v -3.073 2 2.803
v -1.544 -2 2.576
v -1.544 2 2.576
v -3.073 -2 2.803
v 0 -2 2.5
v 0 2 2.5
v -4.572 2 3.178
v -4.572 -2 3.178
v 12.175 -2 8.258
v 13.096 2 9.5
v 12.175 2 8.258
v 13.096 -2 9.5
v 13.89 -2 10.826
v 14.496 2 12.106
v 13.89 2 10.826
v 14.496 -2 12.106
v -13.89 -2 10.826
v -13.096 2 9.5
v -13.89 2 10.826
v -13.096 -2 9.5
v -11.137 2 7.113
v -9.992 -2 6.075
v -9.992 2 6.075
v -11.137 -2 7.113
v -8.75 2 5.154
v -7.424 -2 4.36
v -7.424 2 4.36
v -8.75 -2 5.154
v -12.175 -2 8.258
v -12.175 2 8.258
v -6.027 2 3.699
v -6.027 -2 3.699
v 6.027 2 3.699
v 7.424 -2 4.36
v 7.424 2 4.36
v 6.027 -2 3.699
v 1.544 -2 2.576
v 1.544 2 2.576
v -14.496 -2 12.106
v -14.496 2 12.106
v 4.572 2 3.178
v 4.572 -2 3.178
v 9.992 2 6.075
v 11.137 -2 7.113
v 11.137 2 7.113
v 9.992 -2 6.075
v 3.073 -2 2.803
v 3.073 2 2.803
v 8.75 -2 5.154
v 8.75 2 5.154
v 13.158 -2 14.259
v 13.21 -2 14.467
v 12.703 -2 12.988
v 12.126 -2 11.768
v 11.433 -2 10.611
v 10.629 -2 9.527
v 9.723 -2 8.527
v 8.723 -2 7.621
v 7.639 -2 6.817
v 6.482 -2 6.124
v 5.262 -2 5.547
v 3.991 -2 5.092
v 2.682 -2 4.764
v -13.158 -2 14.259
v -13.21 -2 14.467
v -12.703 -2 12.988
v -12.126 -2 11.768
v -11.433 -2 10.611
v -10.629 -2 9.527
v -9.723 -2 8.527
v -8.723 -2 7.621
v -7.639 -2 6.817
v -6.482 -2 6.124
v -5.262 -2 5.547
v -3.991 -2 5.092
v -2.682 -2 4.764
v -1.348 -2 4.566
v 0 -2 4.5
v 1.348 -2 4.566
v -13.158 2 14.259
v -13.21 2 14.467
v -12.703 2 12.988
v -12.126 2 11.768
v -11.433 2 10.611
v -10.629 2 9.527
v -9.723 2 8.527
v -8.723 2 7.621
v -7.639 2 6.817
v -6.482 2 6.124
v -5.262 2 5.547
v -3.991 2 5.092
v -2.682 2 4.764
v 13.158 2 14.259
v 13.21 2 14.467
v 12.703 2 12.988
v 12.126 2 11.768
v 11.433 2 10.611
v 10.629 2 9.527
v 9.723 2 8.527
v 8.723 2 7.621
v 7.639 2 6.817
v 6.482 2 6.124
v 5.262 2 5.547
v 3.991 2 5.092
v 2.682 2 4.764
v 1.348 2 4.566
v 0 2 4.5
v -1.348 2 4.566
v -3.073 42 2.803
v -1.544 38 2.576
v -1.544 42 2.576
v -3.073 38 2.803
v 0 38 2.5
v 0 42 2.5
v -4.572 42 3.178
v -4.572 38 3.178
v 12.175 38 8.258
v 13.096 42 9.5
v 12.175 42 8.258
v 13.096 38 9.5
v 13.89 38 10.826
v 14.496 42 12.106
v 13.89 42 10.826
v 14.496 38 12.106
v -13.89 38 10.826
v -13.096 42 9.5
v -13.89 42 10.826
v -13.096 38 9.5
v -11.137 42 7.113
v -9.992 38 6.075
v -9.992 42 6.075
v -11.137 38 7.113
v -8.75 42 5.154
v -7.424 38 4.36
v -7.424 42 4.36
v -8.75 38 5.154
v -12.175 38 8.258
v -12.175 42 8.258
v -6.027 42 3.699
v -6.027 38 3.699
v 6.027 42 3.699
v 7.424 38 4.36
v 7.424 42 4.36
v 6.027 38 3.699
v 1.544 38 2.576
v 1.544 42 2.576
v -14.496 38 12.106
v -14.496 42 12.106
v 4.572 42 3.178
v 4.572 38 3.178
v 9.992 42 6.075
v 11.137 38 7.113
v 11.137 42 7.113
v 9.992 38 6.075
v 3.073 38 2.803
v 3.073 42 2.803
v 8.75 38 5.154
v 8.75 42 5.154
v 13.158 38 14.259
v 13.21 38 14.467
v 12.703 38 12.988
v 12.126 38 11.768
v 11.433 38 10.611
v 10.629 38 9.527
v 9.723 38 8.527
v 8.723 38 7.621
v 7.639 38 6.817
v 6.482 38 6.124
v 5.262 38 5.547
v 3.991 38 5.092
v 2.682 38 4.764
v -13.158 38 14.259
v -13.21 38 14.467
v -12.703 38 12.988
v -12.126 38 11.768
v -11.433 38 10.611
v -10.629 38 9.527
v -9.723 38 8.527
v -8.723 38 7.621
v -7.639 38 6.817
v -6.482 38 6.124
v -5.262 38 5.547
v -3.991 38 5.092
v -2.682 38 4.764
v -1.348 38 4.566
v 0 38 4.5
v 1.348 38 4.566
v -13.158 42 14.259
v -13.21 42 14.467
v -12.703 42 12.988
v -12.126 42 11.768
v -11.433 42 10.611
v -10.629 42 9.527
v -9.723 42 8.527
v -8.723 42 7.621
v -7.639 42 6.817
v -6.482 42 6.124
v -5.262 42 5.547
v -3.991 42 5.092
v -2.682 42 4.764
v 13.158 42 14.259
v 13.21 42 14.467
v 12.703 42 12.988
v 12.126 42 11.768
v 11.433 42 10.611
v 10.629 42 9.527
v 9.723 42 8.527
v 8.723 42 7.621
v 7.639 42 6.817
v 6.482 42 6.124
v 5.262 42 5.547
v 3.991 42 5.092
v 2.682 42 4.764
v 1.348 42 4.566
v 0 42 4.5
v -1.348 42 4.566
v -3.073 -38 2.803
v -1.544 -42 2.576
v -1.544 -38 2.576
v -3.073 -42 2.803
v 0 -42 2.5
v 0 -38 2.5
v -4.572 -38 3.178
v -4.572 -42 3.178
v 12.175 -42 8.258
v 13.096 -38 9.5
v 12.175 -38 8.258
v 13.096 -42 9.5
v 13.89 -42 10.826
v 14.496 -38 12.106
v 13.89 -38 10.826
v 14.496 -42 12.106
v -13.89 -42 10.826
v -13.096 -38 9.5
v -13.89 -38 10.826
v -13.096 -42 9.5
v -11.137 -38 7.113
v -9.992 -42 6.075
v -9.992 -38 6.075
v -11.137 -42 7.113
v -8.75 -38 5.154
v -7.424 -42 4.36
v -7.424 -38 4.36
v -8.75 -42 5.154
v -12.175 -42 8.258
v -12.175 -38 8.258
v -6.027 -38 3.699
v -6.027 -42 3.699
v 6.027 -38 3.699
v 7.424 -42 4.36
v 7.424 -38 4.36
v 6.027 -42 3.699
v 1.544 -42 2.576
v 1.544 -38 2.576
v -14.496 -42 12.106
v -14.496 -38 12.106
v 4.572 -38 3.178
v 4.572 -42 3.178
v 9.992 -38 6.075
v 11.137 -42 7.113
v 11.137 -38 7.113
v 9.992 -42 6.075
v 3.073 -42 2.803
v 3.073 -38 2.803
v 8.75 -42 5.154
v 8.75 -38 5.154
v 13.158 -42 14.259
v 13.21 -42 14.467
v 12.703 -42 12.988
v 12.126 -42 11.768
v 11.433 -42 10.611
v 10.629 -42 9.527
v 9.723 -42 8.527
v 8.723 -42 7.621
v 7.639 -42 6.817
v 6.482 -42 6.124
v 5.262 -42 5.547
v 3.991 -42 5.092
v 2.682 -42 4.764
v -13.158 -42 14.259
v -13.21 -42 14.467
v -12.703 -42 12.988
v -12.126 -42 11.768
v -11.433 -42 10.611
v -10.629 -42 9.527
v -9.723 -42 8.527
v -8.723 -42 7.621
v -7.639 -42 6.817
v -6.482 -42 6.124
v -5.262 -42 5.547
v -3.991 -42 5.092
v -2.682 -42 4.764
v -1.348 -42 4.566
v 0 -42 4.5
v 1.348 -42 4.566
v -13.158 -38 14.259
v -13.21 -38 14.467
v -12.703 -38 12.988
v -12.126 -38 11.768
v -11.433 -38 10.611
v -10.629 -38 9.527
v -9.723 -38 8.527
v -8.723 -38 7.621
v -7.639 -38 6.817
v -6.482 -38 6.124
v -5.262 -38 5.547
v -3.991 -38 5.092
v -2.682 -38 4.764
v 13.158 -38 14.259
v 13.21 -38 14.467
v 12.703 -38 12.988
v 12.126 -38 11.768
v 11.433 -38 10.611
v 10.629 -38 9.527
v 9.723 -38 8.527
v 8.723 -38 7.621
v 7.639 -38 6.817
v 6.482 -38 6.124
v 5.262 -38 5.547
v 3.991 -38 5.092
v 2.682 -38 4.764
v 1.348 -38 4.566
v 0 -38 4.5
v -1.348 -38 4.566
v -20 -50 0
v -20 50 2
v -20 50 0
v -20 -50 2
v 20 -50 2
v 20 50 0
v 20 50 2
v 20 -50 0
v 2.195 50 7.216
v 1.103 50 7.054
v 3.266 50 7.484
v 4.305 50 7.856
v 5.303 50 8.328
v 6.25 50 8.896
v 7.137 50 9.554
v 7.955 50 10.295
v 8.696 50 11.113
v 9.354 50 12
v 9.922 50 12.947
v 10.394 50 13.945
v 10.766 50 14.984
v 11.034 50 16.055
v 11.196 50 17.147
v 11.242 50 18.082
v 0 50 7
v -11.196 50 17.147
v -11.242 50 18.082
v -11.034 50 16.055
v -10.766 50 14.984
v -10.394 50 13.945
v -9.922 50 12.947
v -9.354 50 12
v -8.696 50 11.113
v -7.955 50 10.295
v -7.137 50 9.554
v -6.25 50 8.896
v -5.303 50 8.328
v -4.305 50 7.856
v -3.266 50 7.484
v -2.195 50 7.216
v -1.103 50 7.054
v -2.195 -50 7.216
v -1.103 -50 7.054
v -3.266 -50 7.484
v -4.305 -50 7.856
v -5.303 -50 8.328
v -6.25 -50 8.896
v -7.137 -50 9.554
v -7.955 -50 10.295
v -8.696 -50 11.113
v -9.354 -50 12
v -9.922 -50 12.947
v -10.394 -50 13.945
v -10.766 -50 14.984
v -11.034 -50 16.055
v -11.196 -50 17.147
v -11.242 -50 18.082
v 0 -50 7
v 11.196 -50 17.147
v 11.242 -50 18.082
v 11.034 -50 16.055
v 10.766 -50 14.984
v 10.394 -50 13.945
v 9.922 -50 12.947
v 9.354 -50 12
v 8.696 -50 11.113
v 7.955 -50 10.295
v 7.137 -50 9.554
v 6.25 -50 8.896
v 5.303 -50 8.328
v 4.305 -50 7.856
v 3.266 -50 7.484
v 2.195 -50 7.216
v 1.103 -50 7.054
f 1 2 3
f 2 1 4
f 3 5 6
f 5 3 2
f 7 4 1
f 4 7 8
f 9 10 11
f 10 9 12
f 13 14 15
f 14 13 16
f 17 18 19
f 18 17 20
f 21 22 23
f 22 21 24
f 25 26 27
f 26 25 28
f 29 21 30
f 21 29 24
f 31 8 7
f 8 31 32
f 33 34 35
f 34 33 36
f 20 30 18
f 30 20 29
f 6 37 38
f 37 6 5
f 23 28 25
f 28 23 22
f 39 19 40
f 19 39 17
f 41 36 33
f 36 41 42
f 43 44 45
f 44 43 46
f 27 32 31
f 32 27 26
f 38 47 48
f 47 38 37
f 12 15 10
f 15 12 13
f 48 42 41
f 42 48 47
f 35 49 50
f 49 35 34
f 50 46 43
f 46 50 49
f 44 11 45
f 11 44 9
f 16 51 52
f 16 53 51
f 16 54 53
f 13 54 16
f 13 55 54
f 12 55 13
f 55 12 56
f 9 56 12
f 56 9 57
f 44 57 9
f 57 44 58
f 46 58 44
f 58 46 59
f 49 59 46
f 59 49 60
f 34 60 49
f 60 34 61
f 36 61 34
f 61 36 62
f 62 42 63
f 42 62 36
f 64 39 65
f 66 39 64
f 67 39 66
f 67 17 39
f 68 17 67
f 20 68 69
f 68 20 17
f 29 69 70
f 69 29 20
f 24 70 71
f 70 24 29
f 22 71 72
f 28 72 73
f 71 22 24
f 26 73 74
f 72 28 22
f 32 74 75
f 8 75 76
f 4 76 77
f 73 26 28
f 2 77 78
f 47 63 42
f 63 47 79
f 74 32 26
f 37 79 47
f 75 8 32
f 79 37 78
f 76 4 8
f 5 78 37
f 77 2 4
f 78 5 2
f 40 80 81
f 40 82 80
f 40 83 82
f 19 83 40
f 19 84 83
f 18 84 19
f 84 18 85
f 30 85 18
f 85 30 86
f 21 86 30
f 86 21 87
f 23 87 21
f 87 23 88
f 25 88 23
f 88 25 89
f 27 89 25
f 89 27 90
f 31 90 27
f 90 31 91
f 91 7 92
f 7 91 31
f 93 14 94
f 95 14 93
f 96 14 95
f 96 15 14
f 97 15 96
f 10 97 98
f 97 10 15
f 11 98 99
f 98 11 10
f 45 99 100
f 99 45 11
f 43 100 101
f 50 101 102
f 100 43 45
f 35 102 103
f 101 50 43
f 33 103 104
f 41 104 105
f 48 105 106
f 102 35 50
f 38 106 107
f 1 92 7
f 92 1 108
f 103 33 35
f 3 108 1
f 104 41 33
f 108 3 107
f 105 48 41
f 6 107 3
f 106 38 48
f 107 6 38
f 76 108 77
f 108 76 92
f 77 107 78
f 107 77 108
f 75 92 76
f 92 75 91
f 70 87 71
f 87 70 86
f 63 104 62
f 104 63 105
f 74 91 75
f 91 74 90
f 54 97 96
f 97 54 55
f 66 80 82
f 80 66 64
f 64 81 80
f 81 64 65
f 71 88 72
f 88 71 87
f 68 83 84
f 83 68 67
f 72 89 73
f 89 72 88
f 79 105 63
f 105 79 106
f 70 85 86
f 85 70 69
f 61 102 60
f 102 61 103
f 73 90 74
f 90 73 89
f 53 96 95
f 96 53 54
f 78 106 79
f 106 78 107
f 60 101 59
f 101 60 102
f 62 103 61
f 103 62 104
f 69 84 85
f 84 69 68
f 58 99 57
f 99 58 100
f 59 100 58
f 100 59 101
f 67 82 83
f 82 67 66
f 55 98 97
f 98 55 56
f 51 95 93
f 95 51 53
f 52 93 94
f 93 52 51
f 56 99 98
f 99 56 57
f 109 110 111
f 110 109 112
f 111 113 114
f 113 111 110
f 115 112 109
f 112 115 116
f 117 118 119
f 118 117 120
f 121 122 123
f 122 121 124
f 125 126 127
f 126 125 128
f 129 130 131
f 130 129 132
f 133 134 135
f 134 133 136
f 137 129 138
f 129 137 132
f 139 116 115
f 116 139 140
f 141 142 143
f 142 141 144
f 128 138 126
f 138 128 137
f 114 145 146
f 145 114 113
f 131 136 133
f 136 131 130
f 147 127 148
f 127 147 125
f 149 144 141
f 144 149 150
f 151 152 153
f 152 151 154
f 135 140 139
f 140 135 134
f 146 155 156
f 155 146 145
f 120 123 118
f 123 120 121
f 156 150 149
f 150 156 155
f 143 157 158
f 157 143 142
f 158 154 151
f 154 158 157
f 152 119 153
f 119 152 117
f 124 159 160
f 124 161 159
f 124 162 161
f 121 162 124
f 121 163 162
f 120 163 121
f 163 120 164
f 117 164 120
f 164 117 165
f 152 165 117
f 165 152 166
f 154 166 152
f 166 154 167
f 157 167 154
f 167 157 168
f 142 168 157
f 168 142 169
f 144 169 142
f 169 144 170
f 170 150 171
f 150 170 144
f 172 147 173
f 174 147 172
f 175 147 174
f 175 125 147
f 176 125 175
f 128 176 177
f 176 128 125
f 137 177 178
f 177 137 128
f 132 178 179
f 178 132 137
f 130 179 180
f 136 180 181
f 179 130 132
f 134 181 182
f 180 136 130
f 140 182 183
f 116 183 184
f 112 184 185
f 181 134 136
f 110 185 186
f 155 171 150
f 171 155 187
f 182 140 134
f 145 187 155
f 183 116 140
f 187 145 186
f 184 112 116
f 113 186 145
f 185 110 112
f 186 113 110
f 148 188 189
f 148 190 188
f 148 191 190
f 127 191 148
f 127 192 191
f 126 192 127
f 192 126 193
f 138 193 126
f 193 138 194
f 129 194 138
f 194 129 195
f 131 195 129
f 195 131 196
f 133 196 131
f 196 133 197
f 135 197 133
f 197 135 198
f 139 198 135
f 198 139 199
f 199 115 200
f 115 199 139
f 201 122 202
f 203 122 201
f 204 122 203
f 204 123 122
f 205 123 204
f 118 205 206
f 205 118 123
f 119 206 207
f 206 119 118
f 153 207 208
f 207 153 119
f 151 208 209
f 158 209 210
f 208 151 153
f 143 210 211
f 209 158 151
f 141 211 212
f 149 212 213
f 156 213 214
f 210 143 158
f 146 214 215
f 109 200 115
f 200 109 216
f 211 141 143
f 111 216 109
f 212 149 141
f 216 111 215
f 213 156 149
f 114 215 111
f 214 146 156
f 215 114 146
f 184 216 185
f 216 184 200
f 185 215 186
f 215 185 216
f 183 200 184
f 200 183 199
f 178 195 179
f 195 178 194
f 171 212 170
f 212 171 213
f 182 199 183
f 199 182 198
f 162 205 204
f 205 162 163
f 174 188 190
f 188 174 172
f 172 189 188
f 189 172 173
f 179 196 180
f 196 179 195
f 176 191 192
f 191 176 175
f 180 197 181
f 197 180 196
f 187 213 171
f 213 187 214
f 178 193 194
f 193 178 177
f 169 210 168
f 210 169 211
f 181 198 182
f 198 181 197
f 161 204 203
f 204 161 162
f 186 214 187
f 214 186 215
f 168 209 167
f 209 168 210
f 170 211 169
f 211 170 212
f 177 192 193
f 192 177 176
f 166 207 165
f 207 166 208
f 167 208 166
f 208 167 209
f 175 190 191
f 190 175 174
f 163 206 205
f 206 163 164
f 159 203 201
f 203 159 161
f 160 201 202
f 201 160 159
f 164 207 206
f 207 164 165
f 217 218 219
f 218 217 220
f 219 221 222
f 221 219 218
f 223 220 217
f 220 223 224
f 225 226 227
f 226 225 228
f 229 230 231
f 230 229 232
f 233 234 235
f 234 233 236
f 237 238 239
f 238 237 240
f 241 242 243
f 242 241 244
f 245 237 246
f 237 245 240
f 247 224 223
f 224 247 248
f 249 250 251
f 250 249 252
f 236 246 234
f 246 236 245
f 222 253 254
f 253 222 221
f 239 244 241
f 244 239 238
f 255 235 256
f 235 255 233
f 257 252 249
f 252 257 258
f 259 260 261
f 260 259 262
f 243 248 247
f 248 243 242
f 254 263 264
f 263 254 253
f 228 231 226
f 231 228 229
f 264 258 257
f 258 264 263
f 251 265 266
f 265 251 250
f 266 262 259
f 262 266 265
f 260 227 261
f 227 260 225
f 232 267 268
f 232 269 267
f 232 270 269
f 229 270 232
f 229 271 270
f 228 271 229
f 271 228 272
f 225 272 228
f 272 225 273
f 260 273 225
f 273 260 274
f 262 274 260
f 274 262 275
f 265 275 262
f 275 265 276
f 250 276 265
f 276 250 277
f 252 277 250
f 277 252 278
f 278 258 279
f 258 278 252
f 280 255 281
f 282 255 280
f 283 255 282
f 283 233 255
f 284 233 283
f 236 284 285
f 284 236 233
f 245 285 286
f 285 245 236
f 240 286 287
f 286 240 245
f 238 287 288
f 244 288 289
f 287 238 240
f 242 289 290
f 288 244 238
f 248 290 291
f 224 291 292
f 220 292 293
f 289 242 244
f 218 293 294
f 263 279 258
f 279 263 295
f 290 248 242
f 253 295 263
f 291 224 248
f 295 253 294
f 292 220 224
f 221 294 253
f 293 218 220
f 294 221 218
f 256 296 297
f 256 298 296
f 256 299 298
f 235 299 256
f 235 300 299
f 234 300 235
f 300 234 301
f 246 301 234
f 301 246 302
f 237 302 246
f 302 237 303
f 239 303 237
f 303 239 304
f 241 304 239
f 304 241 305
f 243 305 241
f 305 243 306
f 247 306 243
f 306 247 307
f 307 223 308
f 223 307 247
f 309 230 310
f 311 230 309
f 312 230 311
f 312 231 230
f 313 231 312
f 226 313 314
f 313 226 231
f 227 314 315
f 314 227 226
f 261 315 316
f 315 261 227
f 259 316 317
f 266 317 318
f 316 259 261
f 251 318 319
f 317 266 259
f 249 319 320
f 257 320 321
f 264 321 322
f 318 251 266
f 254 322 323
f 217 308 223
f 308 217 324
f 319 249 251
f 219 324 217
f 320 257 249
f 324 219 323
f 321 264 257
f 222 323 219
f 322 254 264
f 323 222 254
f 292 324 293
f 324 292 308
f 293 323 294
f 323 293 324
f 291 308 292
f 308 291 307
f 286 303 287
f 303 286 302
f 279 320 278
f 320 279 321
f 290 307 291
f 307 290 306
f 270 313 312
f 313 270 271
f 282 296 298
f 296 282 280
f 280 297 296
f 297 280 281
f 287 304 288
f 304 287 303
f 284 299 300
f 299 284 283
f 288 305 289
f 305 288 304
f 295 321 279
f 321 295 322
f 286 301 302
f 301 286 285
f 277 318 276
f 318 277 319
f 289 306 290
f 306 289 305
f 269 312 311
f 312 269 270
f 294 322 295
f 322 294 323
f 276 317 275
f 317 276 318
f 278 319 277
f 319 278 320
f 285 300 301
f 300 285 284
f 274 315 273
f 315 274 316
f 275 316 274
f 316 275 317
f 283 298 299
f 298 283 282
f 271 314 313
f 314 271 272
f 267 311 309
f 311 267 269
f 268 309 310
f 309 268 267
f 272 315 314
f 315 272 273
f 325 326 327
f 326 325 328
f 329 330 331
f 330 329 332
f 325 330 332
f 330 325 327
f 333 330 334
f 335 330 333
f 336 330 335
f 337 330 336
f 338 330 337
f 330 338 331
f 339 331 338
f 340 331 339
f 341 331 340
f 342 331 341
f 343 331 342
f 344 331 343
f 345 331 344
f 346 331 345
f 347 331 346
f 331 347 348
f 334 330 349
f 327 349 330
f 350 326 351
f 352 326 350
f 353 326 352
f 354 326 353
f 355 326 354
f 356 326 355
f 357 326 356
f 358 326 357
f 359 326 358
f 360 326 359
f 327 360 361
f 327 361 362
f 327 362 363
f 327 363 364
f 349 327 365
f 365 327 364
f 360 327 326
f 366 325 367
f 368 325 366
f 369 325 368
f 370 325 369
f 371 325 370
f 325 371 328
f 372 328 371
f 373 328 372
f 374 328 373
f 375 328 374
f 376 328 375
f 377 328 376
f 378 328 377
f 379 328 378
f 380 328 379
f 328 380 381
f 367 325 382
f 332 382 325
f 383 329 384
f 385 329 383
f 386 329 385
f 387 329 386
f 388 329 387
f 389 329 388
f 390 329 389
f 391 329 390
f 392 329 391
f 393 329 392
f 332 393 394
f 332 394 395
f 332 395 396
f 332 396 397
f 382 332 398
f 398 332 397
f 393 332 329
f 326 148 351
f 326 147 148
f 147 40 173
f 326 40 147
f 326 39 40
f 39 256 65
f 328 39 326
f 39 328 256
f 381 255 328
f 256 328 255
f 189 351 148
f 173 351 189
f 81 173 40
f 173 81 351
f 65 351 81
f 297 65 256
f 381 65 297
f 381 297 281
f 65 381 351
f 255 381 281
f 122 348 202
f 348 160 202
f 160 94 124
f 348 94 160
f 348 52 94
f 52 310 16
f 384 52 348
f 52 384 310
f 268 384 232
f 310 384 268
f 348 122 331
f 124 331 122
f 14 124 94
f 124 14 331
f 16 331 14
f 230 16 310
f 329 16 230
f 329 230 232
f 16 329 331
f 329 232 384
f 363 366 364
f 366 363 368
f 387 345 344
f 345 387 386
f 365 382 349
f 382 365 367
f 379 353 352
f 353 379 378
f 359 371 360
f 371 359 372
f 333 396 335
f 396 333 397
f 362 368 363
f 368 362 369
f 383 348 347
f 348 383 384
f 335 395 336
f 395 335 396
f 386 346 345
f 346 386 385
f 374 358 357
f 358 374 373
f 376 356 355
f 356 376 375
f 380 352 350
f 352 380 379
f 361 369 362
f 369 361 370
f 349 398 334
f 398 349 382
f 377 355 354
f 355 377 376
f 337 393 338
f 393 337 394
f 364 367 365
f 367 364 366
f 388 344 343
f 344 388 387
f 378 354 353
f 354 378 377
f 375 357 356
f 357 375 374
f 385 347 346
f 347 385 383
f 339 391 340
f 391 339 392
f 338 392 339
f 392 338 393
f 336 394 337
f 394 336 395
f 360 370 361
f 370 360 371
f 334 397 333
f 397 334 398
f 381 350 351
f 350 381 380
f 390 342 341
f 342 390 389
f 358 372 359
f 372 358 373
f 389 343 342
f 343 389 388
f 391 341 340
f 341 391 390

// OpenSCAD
$fn=60+4;

//camera mount pole mounting legnth
camera_mount_lenght = 100 ;

//camera mount pole mount width
camera_mount_width = 40 ;

//camera leg pole diameter
pole_diameter = 22.5 ;

//ziptie width for atatchment add a bit for clearance
ziptie_width = 4 ;

//ziptie height for atatchment
ziptie_height = 2 ;

pole_diameter2 = pole_diameter/2;

centre_point = pole_diameter2+5+ziptie_height ;

rotate([0,0,90])difference(){
	hull(){
		translate([0,0,1])cube([camera_mount_lenght,camera_mount_width,2],true);
		difference(){
			translate([0,0,centre_point])rotate([0,90,0])cylinder(camera_mount_lenght,pole_diameter2-0.1,pole_diameter2-0.1,true);
			translate([0,0,centre_point+pole_diameter2])cube([camera_mount_lenght+2,pole_diameter+2,pole_diameter],true);
			}
		}
	translate([0,0,centre_point])rotate([0,90,0])cylinder(camera_mount_lenght+0.2,pole_diameter2,pole_diameter2,true);
//	translate([0,0,centre_point])cube([camera_mount_lenght+pole_diameter2,camera_mount_width+pole_diameter2,10],true);
	translate([camera_mount_lenght/2-10,0,0])zip();
	zip();
	translate([-camera_mount_lenght/2+10,0,0])zip();
	}

module zip(){
	translate([0,0,centre_point])rotate([0,90,0]){
		difference(){
			cylinder(ziptie_width,pole_diameter2+2.5+ziptie_height,pole_diameter2+2.5+ziptie_height,true);
			cylinder(ziptie_width+0.2,pole_diameter2+2.5,pole_diameter2+2.5,true);
			}
		}
	}
